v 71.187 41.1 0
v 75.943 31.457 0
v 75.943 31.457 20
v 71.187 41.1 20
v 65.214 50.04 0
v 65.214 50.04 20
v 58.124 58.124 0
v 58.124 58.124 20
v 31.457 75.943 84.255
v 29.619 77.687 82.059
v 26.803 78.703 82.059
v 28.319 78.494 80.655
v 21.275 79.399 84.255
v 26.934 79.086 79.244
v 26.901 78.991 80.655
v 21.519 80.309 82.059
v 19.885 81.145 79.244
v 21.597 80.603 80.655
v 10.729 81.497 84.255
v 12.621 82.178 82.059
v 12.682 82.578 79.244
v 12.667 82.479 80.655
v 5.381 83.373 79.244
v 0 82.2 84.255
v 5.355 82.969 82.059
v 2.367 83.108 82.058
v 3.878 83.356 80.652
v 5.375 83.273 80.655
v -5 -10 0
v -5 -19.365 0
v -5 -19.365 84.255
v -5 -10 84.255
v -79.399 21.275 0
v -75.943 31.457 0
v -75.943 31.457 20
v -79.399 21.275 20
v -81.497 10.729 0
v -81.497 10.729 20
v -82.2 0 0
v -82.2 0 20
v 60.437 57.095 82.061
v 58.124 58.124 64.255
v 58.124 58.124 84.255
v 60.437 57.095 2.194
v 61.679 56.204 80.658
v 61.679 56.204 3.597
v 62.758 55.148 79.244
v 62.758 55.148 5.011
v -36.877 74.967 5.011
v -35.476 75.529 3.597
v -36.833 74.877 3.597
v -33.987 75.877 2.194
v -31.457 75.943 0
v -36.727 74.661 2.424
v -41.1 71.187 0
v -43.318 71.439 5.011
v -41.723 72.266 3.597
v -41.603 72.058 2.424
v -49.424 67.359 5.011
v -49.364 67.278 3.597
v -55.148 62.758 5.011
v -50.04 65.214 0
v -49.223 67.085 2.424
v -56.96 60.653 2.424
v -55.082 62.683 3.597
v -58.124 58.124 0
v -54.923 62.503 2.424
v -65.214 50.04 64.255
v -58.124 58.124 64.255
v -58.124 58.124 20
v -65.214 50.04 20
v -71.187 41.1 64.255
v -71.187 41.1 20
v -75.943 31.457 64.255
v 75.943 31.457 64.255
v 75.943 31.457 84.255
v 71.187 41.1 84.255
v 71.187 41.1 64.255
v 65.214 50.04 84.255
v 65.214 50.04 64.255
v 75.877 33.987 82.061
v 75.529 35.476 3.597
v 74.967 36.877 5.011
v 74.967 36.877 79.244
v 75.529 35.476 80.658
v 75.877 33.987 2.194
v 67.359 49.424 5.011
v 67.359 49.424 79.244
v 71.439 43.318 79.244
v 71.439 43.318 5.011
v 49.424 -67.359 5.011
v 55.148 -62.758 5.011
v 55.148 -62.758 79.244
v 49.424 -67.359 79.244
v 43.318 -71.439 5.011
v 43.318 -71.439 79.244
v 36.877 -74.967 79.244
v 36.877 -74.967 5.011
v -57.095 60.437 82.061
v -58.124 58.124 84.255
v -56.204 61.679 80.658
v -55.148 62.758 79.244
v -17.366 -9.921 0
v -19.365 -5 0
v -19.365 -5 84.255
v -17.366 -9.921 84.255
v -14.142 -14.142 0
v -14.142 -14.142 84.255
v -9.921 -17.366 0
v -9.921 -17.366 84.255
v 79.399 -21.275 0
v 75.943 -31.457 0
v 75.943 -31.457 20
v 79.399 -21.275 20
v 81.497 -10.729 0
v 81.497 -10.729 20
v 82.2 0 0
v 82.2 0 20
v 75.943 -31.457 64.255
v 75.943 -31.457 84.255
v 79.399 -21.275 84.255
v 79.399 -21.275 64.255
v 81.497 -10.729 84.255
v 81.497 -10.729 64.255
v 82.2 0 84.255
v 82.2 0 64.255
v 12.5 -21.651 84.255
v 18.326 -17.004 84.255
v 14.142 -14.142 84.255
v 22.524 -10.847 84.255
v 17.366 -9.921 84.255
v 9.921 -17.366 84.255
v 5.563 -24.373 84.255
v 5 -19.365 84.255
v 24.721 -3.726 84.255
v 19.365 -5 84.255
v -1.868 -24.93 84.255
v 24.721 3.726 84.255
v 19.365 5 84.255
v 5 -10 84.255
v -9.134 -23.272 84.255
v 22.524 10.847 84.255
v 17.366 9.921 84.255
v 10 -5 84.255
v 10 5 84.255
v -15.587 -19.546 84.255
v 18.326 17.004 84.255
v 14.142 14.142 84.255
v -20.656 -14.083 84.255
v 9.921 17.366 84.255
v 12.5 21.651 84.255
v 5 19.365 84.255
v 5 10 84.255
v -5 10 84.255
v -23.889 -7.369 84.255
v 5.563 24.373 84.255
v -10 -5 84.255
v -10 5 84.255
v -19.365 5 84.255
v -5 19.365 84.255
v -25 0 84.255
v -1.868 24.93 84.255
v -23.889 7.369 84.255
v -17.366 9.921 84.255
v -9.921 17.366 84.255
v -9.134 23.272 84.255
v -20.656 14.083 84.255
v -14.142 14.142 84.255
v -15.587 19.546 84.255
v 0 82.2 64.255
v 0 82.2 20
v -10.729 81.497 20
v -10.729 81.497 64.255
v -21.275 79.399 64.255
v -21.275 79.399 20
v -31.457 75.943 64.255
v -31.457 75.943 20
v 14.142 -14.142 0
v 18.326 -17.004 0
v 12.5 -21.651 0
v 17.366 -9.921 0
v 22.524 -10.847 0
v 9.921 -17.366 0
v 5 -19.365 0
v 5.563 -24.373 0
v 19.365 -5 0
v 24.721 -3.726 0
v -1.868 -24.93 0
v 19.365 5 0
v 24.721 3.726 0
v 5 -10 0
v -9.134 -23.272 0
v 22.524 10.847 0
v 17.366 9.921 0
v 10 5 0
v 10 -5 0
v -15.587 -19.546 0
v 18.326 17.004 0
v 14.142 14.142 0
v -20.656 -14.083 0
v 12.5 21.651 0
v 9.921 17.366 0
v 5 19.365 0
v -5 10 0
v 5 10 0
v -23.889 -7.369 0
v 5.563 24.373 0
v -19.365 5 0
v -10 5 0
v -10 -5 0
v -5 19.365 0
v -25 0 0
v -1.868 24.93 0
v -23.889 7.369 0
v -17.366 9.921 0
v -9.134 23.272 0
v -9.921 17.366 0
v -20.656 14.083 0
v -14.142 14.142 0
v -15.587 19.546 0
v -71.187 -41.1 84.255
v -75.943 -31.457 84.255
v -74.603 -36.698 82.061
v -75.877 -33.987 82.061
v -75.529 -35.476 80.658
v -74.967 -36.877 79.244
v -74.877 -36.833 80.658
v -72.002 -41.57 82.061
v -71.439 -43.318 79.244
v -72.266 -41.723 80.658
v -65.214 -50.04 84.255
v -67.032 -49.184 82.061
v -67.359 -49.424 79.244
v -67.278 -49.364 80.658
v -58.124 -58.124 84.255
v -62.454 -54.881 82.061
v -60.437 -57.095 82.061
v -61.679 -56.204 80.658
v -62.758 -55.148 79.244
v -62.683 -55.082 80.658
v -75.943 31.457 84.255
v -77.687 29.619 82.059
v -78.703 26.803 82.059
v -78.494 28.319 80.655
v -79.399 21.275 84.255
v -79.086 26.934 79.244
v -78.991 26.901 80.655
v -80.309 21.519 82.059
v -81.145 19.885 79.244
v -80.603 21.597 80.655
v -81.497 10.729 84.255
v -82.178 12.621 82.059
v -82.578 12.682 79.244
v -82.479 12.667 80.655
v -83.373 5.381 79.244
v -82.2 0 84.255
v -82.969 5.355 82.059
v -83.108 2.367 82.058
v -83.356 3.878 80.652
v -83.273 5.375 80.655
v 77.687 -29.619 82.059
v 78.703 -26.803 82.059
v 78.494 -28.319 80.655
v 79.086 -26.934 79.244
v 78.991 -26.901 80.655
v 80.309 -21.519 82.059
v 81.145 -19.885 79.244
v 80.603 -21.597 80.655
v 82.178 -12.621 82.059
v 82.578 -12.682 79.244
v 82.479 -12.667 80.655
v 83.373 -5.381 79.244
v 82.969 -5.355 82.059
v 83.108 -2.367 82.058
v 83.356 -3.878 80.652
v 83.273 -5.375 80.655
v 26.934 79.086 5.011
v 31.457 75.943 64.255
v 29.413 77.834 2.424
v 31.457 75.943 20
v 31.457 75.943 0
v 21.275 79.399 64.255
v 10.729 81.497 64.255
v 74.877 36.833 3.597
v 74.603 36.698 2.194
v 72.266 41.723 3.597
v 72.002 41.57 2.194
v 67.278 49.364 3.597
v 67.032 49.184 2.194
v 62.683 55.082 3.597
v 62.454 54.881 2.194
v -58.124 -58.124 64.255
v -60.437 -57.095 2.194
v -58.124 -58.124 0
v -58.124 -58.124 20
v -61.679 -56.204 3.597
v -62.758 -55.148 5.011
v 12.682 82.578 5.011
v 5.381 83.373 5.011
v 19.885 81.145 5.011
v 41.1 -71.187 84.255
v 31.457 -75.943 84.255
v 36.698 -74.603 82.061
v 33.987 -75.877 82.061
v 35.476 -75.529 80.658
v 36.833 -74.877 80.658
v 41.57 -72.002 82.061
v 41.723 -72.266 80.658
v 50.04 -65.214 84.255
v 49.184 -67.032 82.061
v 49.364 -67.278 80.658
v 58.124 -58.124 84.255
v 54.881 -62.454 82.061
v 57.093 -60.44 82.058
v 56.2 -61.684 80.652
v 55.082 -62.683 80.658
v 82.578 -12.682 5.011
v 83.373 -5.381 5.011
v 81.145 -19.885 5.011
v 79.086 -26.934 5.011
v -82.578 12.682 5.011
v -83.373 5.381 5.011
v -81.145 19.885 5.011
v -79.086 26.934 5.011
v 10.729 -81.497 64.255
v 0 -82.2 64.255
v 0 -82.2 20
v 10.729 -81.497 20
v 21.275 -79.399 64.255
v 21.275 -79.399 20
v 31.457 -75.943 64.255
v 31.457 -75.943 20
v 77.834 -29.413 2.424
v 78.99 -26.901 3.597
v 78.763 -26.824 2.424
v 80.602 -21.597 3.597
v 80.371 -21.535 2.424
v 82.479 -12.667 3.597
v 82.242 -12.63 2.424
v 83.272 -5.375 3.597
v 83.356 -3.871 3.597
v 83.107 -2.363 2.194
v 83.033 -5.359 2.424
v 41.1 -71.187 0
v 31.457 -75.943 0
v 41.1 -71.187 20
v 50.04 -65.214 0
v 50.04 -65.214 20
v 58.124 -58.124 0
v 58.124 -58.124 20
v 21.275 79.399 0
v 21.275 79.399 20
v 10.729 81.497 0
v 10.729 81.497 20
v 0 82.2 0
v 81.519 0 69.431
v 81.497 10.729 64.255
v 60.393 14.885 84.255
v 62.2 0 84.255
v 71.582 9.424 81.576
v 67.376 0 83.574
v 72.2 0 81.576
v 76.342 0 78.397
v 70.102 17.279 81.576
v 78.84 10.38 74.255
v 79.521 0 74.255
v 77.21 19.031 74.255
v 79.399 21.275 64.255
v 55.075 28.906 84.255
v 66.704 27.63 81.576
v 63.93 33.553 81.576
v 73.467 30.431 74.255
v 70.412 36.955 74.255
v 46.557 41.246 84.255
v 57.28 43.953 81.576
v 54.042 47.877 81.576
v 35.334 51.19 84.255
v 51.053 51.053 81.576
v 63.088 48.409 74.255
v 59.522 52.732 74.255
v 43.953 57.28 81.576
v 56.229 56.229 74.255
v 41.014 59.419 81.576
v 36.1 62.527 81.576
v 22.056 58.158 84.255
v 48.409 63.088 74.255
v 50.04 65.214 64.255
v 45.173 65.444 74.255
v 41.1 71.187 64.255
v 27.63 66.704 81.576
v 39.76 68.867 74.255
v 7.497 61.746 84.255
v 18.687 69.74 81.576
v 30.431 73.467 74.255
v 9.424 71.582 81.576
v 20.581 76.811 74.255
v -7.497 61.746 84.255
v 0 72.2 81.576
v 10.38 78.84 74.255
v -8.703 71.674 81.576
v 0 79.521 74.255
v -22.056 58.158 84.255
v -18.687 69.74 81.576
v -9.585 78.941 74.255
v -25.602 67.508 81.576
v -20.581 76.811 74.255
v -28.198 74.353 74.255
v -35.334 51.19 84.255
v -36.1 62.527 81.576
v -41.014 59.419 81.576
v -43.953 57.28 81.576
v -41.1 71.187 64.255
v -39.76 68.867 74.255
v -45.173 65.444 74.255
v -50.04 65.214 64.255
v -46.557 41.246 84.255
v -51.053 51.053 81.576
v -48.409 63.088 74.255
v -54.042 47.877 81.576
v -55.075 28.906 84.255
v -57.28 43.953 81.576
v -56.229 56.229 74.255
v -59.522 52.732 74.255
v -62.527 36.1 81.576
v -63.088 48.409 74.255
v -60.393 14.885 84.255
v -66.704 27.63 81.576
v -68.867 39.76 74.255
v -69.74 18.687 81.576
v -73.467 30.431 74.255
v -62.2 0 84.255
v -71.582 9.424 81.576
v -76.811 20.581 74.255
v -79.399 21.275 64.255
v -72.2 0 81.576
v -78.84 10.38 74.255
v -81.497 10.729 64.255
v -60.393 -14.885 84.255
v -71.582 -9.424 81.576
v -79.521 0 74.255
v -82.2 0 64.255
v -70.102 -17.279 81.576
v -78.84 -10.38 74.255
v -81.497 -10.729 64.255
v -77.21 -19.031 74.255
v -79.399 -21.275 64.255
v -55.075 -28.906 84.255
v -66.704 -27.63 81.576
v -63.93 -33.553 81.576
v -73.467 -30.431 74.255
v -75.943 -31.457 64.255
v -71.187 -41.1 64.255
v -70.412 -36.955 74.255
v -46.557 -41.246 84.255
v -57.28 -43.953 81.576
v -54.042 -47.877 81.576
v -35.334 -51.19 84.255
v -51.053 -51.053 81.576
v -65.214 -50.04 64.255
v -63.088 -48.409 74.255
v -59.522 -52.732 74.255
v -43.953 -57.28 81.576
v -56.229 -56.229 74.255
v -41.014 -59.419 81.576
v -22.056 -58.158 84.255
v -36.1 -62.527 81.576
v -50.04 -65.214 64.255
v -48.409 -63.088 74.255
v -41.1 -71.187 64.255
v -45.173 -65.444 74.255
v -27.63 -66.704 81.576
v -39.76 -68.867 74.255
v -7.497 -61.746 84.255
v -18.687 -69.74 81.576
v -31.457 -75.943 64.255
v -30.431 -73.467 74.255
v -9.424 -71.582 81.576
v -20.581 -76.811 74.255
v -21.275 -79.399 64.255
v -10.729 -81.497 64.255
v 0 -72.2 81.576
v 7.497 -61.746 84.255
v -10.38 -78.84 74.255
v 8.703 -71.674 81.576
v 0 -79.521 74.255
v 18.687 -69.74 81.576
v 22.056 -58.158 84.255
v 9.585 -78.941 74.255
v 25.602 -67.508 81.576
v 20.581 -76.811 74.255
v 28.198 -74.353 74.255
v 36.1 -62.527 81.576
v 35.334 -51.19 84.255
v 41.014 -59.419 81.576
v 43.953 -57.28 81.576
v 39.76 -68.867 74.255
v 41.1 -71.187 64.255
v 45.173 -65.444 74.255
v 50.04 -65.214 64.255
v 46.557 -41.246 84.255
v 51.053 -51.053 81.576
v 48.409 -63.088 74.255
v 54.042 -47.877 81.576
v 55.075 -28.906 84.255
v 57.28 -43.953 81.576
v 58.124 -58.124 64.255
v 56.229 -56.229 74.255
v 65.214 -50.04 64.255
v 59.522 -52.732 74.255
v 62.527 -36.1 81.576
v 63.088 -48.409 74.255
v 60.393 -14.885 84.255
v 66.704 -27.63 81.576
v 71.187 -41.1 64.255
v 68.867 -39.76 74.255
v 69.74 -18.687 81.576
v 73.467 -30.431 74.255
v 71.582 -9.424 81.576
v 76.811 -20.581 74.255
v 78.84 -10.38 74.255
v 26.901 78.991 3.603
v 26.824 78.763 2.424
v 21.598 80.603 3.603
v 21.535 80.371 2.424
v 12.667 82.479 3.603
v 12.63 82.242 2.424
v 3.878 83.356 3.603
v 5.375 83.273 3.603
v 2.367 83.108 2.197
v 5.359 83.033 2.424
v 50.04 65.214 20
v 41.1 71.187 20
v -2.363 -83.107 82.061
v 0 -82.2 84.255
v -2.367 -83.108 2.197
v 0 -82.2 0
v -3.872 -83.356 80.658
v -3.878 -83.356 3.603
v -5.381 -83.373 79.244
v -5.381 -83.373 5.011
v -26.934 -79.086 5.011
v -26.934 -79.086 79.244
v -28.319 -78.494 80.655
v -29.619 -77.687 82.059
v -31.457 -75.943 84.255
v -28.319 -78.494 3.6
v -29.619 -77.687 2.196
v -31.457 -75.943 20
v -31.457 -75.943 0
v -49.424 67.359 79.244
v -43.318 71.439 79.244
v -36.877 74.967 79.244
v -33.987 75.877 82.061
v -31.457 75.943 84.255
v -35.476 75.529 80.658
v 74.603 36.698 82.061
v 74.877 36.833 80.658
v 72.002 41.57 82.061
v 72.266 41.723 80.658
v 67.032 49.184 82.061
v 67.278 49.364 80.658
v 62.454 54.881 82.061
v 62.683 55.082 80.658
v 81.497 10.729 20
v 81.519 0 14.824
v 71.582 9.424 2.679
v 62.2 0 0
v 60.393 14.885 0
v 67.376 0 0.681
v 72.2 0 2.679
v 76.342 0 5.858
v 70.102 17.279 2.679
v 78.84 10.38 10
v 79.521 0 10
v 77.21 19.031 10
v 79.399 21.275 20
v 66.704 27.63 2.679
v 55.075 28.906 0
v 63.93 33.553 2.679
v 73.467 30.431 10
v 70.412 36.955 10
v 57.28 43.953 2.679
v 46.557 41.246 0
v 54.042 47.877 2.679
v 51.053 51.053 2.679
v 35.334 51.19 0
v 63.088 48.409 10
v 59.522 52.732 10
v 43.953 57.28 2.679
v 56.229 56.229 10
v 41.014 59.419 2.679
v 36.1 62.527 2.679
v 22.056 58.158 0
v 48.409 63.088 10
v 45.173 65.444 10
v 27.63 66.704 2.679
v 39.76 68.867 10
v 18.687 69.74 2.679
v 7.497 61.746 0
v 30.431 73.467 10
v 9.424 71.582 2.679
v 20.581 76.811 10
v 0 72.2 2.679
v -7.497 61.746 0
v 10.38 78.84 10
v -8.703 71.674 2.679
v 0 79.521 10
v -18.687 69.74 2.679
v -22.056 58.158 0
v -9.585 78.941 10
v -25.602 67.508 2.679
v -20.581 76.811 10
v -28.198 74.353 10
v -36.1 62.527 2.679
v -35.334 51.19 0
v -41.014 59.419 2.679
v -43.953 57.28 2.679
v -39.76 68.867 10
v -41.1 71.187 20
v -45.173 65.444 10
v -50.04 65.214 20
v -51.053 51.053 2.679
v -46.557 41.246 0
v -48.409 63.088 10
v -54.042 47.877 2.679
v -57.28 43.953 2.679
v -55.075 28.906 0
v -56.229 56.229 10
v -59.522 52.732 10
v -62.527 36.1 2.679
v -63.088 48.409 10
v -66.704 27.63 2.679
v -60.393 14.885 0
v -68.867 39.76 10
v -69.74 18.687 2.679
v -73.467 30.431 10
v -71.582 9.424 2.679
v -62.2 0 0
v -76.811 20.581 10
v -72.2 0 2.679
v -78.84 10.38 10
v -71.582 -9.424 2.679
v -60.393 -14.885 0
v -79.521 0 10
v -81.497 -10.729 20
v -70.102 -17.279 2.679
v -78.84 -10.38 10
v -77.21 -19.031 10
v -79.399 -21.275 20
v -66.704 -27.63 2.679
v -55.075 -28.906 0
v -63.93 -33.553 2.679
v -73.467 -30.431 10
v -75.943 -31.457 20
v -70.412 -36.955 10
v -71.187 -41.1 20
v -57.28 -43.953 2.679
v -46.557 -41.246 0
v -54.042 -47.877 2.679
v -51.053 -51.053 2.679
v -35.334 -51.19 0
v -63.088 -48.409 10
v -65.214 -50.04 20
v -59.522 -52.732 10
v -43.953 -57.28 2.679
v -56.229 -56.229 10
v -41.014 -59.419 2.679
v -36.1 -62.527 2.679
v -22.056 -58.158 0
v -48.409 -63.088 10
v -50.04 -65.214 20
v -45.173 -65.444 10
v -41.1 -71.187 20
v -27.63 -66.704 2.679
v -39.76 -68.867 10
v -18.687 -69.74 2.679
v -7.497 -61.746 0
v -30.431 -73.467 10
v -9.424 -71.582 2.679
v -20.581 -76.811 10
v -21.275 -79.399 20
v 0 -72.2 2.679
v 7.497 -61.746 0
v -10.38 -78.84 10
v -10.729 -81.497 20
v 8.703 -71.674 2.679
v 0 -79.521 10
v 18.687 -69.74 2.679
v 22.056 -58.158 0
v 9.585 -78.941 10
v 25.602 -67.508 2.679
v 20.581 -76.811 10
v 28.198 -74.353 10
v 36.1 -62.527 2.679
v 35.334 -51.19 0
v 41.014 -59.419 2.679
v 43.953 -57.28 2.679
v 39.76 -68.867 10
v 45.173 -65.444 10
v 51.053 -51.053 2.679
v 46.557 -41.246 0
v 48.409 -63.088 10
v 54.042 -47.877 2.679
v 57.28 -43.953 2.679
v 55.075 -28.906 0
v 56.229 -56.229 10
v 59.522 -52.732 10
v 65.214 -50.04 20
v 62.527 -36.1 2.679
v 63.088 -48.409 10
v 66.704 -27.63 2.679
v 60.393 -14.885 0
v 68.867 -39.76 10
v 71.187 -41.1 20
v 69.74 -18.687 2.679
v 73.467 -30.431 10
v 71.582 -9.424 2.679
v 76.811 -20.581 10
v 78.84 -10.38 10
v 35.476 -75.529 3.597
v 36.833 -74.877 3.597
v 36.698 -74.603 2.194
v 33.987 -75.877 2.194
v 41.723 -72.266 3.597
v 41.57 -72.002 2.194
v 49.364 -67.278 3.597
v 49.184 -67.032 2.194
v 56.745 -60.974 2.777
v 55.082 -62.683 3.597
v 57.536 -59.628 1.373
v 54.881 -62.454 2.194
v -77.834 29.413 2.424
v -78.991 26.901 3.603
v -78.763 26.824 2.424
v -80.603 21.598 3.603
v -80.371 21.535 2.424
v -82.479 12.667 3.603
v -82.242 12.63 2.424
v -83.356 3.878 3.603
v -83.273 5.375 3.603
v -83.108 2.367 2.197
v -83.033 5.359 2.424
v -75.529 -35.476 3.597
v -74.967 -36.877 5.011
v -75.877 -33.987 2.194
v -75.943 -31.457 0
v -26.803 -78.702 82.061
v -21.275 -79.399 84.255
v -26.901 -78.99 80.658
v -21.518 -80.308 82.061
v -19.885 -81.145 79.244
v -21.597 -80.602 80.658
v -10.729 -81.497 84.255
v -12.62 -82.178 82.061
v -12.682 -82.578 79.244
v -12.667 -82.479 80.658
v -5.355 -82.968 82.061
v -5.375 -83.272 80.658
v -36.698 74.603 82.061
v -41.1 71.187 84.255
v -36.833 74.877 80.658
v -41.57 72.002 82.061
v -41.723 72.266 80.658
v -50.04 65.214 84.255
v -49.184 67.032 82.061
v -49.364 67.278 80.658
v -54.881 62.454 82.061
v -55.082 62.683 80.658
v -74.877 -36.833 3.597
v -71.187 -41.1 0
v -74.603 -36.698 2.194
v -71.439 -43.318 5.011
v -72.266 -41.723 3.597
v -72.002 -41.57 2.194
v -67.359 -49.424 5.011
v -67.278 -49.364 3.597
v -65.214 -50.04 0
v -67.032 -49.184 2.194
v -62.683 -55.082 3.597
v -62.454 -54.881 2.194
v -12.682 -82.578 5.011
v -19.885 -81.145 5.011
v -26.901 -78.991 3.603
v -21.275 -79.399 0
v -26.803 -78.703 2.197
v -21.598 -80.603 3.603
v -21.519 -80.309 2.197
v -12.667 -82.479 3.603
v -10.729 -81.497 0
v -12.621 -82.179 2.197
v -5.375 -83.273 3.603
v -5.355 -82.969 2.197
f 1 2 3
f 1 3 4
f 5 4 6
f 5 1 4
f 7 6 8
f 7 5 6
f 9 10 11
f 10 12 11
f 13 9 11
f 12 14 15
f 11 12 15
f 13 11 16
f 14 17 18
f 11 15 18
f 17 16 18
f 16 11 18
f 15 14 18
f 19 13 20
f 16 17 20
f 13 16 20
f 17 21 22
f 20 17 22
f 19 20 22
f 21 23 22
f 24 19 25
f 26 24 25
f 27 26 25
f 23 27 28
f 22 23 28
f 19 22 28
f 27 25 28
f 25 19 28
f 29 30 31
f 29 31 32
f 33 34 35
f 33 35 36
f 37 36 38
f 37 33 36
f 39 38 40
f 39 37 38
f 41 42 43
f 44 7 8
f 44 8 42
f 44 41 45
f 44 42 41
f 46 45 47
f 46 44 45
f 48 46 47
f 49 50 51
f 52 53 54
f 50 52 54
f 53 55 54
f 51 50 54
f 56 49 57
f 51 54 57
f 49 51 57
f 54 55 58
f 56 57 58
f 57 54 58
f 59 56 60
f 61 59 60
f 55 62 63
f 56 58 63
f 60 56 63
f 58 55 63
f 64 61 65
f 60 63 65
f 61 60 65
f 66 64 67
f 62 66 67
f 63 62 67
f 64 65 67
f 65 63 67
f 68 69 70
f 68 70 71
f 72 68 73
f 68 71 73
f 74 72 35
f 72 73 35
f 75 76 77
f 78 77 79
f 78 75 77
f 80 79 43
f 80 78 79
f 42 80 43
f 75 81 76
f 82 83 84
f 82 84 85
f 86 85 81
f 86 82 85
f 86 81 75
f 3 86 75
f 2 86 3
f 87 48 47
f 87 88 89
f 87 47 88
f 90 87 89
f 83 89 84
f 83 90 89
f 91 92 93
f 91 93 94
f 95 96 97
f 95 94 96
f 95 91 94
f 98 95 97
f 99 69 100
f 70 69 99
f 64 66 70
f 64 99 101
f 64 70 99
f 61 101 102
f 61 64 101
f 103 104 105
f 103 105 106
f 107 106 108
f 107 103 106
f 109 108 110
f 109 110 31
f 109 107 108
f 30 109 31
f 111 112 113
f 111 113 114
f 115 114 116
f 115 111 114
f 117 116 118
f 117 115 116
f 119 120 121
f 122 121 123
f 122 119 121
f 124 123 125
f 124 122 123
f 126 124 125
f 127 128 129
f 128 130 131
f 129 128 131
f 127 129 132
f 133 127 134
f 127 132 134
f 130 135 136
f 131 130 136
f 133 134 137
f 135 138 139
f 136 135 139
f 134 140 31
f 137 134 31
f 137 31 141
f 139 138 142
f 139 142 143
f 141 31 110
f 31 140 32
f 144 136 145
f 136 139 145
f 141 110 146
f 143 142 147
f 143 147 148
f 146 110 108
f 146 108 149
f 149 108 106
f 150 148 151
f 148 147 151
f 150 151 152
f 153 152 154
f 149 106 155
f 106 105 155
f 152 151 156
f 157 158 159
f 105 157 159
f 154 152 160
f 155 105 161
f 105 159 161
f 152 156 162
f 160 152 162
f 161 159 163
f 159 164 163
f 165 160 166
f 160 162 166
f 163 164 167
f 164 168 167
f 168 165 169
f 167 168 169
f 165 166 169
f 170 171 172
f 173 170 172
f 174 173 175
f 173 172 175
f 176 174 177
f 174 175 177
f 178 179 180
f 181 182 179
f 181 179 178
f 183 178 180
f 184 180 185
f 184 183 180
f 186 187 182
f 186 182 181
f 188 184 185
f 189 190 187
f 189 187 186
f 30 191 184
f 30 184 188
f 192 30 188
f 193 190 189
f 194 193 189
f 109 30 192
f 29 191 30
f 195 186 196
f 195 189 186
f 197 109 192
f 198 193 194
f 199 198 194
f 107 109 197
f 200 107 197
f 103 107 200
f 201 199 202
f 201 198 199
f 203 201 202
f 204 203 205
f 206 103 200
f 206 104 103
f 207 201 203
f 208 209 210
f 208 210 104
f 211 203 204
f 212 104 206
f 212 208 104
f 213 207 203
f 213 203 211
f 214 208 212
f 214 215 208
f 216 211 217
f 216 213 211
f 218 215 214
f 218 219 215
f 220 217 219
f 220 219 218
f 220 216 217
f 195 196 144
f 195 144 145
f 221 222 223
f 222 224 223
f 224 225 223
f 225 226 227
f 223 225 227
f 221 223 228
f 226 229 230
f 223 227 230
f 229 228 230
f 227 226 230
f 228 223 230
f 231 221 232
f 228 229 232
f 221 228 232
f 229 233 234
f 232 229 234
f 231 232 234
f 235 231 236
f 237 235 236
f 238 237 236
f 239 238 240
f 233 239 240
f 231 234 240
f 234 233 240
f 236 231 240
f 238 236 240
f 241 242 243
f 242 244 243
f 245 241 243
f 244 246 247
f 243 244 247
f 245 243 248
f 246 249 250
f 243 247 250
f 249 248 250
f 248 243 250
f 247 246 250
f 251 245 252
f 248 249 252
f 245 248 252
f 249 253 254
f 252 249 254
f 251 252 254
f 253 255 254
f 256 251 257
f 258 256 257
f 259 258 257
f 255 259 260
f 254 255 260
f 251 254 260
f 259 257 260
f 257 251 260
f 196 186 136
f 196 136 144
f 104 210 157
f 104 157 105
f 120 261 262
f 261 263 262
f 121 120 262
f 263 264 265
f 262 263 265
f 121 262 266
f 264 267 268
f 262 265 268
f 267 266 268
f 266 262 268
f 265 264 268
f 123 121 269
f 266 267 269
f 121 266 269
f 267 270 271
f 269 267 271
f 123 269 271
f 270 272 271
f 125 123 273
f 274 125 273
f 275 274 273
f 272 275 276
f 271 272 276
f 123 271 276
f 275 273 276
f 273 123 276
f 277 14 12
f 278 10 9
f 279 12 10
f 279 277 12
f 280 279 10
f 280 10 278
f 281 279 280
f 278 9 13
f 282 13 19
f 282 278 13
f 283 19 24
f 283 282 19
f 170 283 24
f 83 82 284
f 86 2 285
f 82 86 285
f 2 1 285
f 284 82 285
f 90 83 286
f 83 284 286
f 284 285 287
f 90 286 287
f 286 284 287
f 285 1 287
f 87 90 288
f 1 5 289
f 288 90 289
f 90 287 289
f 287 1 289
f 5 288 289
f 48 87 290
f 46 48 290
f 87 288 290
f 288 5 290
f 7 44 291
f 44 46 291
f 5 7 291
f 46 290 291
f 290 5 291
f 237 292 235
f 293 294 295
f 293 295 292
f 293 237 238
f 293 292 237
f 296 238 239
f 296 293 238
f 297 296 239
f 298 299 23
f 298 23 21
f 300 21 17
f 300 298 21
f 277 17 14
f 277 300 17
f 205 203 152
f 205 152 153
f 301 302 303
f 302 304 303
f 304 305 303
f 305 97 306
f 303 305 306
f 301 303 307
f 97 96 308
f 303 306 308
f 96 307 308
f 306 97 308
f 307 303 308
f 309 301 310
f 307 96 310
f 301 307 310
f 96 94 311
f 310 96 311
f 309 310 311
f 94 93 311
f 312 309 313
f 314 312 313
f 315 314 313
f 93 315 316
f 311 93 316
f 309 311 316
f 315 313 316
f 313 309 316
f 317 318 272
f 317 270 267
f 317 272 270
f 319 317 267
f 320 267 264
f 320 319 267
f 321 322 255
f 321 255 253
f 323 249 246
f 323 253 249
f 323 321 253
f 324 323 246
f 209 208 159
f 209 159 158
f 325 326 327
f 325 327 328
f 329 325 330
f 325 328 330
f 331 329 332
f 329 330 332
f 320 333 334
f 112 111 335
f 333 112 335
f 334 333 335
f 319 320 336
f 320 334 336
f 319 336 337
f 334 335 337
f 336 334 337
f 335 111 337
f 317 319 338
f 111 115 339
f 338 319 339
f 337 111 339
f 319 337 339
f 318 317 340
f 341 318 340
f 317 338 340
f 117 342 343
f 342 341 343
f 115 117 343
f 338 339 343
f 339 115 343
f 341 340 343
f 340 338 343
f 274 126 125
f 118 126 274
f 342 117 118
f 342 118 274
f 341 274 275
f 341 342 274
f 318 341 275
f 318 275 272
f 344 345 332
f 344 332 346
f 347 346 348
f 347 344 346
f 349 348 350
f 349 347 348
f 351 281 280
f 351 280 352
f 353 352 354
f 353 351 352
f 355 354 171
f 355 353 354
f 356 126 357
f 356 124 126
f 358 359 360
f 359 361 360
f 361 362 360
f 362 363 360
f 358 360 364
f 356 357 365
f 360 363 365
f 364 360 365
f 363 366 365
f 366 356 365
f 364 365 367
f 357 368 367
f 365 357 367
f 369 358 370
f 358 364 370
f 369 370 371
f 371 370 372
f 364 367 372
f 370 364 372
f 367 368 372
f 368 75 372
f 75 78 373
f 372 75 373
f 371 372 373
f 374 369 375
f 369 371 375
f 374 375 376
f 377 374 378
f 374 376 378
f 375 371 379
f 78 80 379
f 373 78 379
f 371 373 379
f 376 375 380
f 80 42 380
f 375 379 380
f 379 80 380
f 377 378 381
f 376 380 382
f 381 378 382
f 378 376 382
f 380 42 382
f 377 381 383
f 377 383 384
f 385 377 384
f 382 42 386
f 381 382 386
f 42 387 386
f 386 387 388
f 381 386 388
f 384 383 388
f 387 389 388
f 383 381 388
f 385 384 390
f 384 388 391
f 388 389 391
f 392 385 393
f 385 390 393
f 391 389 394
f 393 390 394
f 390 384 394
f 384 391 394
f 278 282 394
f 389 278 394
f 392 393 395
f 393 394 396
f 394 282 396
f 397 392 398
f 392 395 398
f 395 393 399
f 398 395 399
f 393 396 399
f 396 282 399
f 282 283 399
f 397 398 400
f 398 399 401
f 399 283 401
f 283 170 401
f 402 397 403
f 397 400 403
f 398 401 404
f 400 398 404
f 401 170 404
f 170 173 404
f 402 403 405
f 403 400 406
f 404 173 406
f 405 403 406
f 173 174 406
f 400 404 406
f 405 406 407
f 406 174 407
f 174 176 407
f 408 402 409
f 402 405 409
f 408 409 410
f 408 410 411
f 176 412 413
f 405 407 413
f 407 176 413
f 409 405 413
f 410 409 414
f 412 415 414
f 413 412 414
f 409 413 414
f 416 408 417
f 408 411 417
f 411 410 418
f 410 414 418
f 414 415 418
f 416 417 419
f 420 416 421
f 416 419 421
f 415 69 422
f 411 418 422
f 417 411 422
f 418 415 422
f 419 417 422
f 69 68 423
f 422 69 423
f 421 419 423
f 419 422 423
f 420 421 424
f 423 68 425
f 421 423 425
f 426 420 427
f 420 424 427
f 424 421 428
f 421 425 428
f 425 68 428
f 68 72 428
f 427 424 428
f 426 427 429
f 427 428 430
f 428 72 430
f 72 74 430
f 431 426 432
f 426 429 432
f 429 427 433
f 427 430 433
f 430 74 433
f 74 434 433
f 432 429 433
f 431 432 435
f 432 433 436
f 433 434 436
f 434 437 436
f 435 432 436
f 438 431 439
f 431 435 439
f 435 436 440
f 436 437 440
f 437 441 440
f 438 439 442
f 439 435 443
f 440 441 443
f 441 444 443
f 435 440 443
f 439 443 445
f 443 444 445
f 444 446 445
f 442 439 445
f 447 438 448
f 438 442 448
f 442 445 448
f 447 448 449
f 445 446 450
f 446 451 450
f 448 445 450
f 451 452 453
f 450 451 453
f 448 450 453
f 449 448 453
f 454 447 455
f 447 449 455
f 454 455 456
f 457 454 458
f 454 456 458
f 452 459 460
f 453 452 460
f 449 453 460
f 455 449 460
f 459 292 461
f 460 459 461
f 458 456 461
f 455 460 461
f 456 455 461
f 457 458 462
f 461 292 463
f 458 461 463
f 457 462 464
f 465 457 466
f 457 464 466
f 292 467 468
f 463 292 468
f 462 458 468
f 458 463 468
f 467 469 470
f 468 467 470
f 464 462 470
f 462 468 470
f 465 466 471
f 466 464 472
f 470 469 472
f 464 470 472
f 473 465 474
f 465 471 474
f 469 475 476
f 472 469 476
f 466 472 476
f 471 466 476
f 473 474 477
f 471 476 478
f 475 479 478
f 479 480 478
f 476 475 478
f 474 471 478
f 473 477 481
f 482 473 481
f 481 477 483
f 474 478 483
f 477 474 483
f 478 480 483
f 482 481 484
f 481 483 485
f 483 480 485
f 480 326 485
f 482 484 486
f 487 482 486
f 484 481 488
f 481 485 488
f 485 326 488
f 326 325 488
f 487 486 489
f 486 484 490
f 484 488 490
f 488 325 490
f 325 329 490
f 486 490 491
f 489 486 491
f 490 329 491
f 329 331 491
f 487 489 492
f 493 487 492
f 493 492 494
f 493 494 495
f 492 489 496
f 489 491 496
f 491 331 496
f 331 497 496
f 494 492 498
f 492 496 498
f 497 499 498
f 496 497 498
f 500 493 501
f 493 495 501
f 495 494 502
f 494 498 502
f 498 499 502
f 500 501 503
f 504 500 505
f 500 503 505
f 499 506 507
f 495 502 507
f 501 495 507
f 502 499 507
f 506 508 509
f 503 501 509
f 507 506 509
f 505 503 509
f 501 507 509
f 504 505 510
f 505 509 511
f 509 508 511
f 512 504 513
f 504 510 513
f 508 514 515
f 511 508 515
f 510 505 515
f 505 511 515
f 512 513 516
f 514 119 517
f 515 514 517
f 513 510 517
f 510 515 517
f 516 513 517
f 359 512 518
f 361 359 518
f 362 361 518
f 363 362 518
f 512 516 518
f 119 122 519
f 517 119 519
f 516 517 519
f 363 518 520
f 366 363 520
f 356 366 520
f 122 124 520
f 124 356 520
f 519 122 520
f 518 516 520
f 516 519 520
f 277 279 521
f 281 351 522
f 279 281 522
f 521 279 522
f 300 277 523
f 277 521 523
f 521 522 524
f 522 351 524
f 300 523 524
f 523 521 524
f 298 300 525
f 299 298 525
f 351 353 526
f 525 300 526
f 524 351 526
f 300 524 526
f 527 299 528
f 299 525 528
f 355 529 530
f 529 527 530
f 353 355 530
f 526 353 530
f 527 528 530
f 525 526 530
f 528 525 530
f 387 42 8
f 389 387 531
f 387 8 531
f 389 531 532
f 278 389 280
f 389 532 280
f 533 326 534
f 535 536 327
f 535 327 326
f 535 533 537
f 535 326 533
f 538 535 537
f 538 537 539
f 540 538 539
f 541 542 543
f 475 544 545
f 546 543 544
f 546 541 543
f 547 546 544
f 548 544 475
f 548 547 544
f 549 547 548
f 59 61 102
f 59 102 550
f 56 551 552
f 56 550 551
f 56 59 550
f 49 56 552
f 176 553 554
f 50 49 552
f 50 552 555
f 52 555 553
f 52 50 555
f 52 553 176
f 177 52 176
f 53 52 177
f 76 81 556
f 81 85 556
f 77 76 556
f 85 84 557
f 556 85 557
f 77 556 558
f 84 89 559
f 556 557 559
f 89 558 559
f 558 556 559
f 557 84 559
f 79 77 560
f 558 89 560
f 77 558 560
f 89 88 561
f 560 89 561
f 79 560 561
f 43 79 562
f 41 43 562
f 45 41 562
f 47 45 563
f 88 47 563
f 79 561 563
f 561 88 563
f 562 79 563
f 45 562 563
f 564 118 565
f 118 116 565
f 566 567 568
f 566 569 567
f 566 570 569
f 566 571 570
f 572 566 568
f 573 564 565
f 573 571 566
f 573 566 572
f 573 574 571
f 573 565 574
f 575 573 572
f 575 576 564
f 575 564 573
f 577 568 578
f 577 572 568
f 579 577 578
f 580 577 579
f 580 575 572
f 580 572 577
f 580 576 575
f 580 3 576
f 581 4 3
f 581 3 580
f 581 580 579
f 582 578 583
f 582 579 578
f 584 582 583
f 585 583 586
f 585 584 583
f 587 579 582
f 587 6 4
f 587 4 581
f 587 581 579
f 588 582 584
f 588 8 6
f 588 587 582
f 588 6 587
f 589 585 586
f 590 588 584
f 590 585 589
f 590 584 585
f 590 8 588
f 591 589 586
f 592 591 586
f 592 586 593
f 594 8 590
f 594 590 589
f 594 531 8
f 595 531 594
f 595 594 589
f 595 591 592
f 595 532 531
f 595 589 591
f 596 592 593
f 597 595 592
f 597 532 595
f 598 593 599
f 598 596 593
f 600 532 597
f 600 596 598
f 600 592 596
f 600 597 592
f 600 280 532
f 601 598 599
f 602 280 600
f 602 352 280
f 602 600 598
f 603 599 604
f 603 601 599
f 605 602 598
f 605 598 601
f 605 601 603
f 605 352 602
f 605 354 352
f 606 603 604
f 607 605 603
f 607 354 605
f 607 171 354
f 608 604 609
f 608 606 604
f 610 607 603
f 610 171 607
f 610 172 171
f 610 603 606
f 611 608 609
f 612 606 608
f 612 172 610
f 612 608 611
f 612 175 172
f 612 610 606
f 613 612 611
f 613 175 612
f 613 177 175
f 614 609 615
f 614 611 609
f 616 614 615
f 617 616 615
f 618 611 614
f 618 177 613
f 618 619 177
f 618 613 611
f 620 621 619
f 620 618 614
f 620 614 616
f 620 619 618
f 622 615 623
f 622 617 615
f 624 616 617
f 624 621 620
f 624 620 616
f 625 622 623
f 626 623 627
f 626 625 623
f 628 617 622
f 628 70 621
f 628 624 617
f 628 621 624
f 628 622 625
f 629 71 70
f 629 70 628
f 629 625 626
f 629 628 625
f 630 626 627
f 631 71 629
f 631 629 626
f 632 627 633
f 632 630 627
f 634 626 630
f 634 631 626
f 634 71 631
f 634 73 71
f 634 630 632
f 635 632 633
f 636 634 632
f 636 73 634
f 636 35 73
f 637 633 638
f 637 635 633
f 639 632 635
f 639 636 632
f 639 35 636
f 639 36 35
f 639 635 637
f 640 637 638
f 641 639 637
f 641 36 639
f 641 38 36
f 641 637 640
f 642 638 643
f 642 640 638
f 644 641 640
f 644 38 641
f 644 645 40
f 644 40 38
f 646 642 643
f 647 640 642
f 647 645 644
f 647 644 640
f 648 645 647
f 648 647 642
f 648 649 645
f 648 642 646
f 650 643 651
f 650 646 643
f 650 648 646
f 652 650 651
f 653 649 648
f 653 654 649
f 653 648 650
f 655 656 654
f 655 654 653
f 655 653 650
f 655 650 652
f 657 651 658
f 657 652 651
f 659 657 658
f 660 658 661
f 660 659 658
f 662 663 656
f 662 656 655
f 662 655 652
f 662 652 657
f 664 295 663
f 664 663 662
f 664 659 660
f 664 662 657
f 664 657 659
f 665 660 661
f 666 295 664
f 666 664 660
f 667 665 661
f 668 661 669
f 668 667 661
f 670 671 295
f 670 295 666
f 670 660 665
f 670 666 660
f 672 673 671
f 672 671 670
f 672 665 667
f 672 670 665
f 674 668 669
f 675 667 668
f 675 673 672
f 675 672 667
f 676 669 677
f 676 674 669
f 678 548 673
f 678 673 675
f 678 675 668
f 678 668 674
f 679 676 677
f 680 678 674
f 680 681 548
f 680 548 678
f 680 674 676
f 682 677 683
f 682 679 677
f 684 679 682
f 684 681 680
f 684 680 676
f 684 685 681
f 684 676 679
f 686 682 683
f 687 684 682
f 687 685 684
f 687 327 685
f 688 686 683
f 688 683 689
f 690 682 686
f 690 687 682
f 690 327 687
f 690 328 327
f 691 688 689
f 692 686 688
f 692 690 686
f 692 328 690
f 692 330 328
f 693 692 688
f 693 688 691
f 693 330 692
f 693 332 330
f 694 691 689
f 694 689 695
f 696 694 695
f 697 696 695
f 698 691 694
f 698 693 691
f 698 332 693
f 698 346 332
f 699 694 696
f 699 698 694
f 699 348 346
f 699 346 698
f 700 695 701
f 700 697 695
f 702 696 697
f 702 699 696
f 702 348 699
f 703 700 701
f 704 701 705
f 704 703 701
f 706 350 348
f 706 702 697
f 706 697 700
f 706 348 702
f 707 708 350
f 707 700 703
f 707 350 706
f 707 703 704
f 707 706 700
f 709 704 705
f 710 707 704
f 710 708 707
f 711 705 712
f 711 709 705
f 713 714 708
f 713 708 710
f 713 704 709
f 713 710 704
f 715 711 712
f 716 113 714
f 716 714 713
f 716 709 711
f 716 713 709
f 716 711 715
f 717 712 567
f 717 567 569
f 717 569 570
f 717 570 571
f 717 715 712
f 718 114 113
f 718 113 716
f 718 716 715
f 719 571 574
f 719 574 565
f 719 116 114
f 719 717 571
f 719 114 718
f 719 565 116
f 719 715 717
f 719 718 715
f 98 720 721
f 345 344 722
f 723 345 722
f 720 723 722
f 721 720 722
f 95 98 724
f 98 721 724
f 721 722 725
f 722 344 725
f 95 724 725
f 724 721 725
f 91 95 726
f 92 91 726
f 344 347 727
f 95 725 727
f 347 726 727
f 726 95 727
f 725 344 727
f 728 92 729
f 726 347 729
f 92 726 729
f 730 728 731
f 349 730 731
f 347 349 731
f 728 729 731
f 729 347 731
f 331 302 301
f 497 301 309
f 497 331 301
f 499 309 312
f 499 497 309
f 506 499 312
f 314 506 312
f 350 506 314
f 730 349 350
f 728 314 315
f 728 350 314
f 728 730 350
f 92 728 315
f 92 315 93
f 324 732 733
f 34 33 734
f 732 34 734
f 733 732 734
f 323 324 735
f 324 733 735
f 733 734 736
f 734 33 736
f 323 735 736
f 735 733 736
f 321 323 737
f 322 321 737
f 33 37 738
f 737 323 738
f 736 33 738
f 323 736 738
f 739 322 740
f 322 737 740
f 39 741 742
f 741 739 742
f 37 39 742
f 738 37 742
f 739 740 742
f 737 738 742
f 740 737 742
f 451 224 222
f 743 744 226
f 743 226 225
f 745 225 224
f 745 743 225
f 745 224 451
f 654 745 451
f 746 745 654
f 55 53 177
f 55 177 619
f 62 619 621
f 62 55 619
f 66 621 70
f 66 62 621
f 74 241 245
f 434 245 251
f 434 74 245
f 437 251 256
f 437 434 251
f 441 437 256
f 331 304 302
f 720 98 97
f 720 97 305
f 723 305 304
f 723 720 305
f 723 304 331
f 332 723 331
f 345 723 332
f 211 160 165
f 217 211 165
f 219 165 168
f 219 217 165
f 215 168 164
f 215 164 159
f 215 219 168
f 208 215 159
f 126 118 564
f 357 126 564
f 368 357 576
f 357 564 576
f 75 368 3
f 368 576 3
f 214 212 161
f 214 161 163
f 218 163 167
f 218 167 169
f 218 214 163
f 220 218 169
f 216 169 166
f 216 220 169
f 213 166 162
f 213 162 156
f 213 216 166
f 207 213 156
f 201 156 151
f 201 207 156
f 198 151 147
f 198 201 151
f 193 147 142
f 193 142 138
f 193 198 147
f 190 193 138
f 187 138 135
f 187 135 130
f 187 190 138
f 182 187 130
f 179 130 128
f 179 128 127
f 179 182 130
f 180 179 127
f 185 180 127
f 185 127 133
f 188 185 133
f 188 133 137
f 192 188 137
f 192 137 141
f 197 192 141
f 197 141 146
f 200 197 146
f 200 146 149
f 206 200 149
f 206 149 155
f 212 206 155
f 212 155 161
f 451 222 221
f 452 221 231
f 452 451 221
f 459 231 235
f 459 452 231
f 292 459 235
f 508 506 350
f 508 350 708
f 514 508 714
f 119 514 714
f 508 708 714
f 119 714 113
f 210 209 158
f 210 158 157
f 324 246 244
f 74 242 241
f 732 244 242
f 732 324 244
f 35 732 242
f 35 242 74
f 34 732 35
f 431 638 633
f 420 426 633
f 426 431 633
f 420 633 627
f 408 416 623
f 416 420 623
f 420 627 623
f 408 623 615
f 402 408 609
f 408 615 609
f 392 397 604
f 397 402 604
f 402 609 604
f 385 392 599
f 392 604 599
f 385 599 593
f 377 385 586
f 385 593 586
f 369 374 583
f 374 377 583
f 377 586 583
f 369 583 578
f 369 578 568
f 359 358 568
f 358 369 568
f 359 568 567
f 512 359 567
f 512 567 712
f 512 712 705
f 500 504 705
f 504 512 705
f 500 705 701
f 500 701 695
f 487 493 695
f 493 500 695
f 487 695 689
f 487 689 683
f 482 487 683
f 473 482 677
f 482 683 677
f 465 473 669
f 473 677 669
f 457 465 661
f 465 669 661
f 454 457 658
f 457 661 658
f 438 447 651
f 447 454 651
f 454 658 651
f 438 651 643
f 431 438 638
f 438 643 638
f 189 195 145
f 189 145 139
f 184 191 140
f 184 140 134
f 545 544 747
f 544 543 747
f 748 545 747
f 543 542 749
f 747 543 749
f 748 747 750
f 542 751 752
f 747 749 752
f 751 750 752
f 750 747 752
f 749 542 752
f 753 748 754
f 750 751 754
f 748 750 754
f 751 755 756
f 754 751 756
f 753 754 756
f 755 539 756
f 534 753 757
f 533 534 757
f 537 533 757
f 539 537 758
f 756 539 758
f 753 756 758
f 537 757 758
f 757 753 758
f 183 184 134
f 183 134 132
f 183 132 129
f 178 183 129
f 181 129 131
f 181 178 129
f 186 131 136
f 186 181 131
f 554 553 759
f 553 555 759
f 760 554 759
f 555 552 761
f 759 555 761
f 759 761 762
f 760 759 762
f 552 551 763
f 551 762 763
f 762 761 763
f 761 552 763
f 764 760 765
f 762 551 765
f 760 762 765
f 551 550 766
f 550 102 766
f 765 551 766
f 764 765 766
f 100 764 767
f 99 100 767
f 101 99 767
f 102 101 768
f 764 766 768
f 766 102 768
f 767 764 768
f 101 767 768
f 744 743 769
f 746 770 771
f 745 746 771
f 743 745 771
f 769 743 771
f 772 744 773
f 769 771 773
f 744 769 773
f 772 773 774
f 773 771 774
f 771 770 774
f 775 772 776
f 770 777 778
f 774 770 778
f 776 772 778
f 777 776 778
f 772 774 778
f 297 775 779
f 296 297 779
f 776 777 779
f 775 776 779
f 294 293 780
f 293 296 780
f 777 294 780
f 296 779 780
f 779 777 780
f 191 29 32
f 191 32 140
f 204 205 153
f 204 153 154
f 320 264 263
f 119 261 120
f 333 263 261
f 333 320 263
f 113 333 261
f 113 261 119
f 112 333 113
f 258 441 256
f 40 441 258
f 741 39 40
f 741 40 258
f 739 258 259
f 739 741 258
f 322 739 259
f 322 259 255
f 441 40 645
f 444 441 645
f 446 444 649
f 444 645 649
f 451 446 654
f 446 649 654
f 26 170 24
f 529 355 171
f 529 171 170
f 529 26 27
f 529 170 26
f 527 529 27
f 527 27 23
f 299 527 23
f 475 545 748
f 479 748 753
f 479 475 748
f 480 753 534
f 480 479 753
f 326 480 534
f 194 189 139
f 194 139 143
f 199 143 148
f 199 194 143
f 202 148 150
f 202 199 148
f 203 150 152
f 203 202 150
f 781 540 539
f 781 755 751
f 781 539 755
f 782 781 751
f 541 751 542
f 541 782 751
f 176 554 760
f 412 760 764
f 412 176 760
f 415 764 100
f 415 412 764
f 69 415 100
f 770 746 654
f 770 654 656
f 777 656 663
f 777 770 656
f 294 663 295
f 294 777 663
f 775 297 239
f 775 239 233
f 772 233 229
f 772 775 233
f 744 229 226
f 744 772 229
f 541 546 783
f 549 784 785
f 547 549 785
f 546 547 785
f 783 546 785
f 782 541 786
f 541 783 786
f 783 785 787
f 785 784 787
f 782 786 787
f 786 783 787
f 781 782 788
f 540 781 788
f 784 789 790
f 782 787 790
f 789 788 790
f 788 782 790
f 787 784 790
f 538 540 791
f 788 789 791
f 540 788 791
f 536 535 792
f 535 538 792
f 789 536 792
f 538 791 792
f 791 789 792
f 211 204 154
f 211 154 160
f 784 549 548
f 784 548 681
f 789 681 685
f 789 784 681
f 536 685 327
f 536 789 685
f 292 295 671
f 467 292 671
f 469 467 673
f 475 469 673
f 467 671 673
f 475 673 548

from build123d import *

# Parameters (mm, degrees)
SKETCH1_R           = 82.2
SKETCH1_R_2         = 20
BOSS_EXTRUDE1_DEPTH = 84.255
BOSS_EXTRUDE2_DEPTH = 84.255
FILLET1_R           = 20
SKETCH3_R           = 62.2
SKETCH3_R_2         = 25
CUT_EXTRUDE1_DEPTH  = 142
BOSS_EXTRUDE3_DEPTH = 84.255
FILLET2_DEPTH       = 84.255


with BuildPart() as part:
    # Sketch1 → Boss-Extrude1 (new body)
    with BuildSketch(Plane.XY):
        Circle(SKETCH1_R)
        Circle(SKETCH1_R_2, mode=Mode.SUBTRACT)
    extrude(amount=BOSS_EXTRUDE1_DEPTH)

    # Sketch2 → Boss-Extrude2 (add)
    with BuildSketch(Plane(origin=(0, 0, 0), x_dir=(-1, 0, 0), z_dir=(0, 0, -1))):
        with BuildLine():
            ThreePointArc((20, 0), (19.840593925, 2.52008585), (19.364916731, 5))
            Line((19.364916731, 5), (9.999996731, 5))
            Line((9.999996731, 5), (9.999996731, -5))
            Line((9.999996731, -5), (19.364916731, -5))
            ThreePointArc((19.364916731, -5), (19.840593925, -2.52008585), (20, 0))
        make_face()
        with BuildLine():
            ThreePointArc((5, 19.364916731), (0, 20), (-5, 19.364916731))
            Line((-5, 19.364916731), (-5, 10))
            Line((-5, 10), (5, 10))
            Line((5, 10), (5, 19.364916731))
        make_face()
        with BuildLine():
            Line((-9.999996731, 5), (-19.364916731, 5))
            ThreePointArc((-19.364916731, 5), (-20, 0), (-19.364916731, -5))
            Line((-19.364916731, -5), (-9.999996731, -5))
            Line((-9.999996731, -5), (-9.999996731, 5))
        make_face()
        with BuildLine():
            Line((-5, -10), (-5, -19.364916731))
            ThreePointArc((-5, -19.364916731), (0, -20), (5, -19.364916731))
            Line((5, -19.364916731), (5, -10))
            Line((5, -10), (-5, -10))
        make_face()
    extrude(amount=-BOSS_EXTRUDE2_DEPTH)

    # Fillet1
    fillet1_edges = [part.edges().sort_by_distance(p)[0] for p in [
        (-82.2, 0, 0),
        (-82.2, 0, 84.255),
    ]]
    fillet(fillet1_edges, radius=FILLET1_R)

    # Sketch3 → Cut-Extrude1 (cut)
    with BuildSketch(Plane(origin=(0, 0, 0), x_dir=(-1, 0, 0), z_dir=(0, 0, -1))):
        Circle(SKETCH3_R)
        Circle(SKETCH3_R_2, mode=Mode.SUBTRACT)
    extrude(amount=-CUT_EXTRUDE1_DEPTH, mode=Mode.SUBTRACT)


with BuildPart() as cut_extrude1_piece_1:
    # of the separate pieces the step leaves, piece 1, a body of its own (cut_extrude1_pieces)
    add(part.part.solids().sort_by_distance((82.2, 0, 20))[0])

    # Sketch5 → Boss-Extrude3 (add)
    with BuildSketch(Plane(origin=(0, 0, 0), x_dir=(-1, 0, 0), z_dir=(0, 0, -1))):
        with BuildLine():
            ThreePointArc((-31.45657814, 75.942897572), (-16.03642447, 80.620550049), (0, 82.2))
            Line((0, 82.2), (0, 83.546013048))
            ThreePointArc((0, 83.546013048), (-16.299018589, 81.940699834), (-31.971675034, 77.186451478))
            Line((-31.971675034, 77.186451478), (-31.45657814, 75.942897572))
        make_face()
        with BuildLine():
            ThreePointArc((-75.942897572, 31.45657814), (-68.346802131, 45.667873154), (-58.124177414, 58.124177414))
            Line((-58.124177414, 58.124177414), (-59.075952367, 59.075952367))
            ThreePointArc((-59.075952367, 59.075952367), (-69.465971078, 46.415677937), (-77.186451478, 31.971675034))
            Line((-77.186451478, 31.971675034), (-75.942897572, 31.45657814))
        make_face()
        with BuildLine():
            ThreePointArc((-75.942897572, -31.45657814), (-80.620550049, -16.03642447), (-82.2, 0))
            Line((-82.2, 0), (-83.546013048, 0))
            ThreePointArc((-83.546013048, 0), (-81.940699834, -16.299018589), (-77.186451478, -31.971675034))
            Line((-77.186451478, -31.971675034), (-75.942897572, -31.45657814))
        make_face()
        with BuildLine():
            ThreePointArc((-31.45657814, -75.942897572), (-45.667873154, -68.346802131), (-58.124177414, -58.124177414))
            Line((-58.124177414, -58.124177414), (-59.075952367, -59.075952367))
            ThreePointArc((-59.075952367, -59.075952367), (-46.415677937, -69.465971078), (-31.971675034, -77.186451478))
            Line((-31.971675034, -77.186451478), (-31.45657814, -75.942897572))
        make_face()
        with BuildLine():
            ThreePointArc((31.45657814, -75.942897572), (16.03642447, -80.620550049), (0, -82.2))
            Line((0, -82.2), (0, -83.546013048))
            ThreePointArc((0, -83.546013048), (16.299018589, -81.940699834), (31.971675034, -77.186451478))
            Line((31.971675034, -77.186451478), (31.45657814, -75.942897572))
        make_face()
        with BuildLine():
            ThreePointArc((75.942897572, -31.45657814), (68.346802131, -45.667873154), (58.124177414, -58.124177414))
            Line((58.124177414, -58.124177414), (59.075952367, -59.075952367))
            ThreePointArc((59.075952367, -59.075952367), (69.465971078, -46.415677937), (77.186451478, -31.971675034))
            Line((77.186451478, -31.971675034), (75.942897572, -31.45657814))
        make_face()
        with BuildLine():
            ThreePointArc((75.942897572, 31.45657814), (80.620550049, 16.03642447), (82.2, 0))
            Line((82.2, 0), (83.546013048, 0))
            ThreePointArc((83.546013048, 0), (81.940699834, 16.299018589), (77.186451478, 31.971675034))
            Line((77.186451478, 31.971675034), (75.942897572, 31.45657814))
        make_face()
        with BuildLine():
            ThreePointArc((31.45657814, 75.942897572), (45.667873154, 68.346802131), (58.124177414, 58.124177414))
            Line((58.124177414, 58.124177414), (59.075952367, 59.075952367))
            ThreePointArc((59.075952367, 59.075952367), (46.415677937, 69.465971078), (31.971675034, 77.186451478))
            Line((31.971675034, 77.186451478), (31.45657814, 75.942897572))
        make_face()
    extrude(amount=-BOSS_EXTRUDE3_DEPTH)

    # Fillet2: read off the stored shape, not the designer's step
    # Fillet2 outline → Fillet2 (cut)
    with BuildSketch(Plane.XY):
        with BuildLine():
            ThreePointArc((0, 82.2), (2.608384979, 83.164048917), (5.381398308, 83.372518544))
            ThreePointArc((5.381398308, 83.372518544), (2.692097142, 83.502628157), (0, 83.546013048))
            Line((0, 83.546013048), (0, 82.2))
        make_face()
        with BuildLine():
            ThreePointArc((31.971675034, 77.186451478), (29.467898906, 78.17659004), (26.933517808, 79.085535433))
            ThreePointArc((26.933517808, 79.085535433), (29.415670194, 77.831748352), (31.45657814, 75.942897572))
            Line((31.45657814, 75.942897572), (31.971675034, 77.186451478))
        make_face()
        with BuildLine():
            ThreePointArc((-58.124177414, 58.124177414), (-56.961456234, 60.650269647), (-55.148049991, 62.758496463))
            ThreePointArc((-55.148049991, 62.758496463), (-57.141674472, 60.948874762), (-59.075952367, 59.075952367))
            Line((-59.075952367, 59.075952367), (-58.124177414, 58.124177414))
        make_face()
        with BuildLine():
            ThreePointArc((-31.971675034, 77.186451478), (-34.442245804, 76.116148091), (-36.877045315, 74.966791481))
            ThreePointArc((-36.877045315, 74.966791481), (-34.235337184, 75.835376919), (-31.45657814, 75.942897572))
            Line((-31.45657814, 75.942897572), (-31.971675034, 77.186451478))
        make_face()
        with BuildLine():
            ThreePointArc((-82.2, 0), (-83.164048917, 2.608384979), (-83.372518544, 5.381398308))
            ThreePointArc((-83.372518544, 5.381398308), (-83.502628157, 2.692097142), (-83.546013048, 0))
            Line((-83.546013048, 0), (-82.2, 0))
        make_face()
        with BuildLine():
            ThreePointArc((-77.186451478, 31.971675034), (-78.17659004, 29.467898906), (-79.085535433, 26.933517808))
            ThreePointArc((-79.085535433, 26.933517808), (-77.831748352, 29.415670194), (-75.942897572, 31.45657814))
            Line((-75.942897572, 31.45657814), (-77.186451478, 31.971675034))
        make_face()
        with BuildLine():
            ThreePointArc((-58.124177414, -58.124177414), (-60.650269647, -56.961456234), (-62.758496463, -55.148049991))
            ThreePointArc((-62.758496463, -55.148049991), (-60.948874762, -57.141674472), (-59.075952367, -59.075952367))
            Line((-59.075952367, -59.075952367), (-58.124177414, -58.124177414))
        make_face()
        with BuildLine():
            ThreePointArc((-77.186451478, -31.971675034), (-76.116148091, -34.442245804), (-74.966791481, -36.877045315))
            ThreePointArc((-74.966791481, -36.877045315), (-75.835376919, -34.235337184), (-75.942897572, -31.45657814))
            Line((-75.942897572, -31.45657814), (-77.186451478, -31.971675034))
        make_face()
        with BuildLine():
            ThreePointArc((0, -82.2), (-2.608384979, -83.164048917), (-5.381398308, -83.372518544))
            ThreePointArc((-5.381398308, -83.372518544), (-2.692097142, -83.502628157), (0, -83.546013048))
            Line((0, -83.546013048), (0, -82.2))
        make_face()
        with BuildLine():
            ThreePointArc((-31.971675034, -77.186451478), (-29.467898906, -78.17659004), (-26.933517808, -79.085535433))
            ThreePointArc((-26.933517808, -79.085535433), (-29.415670194, -77.831748352), (-31.45657814, -75.942897572))
            Line((-31.45657814, -75.942897572), (-31.971675034, -77.186451478))
        make_face()
        with BuildLine():
            ThreePointArc((58.124177414, -58.124177414), (56.961456234, -60.650269647), (55.148049991, -62.758496463))
            ThreePointArc((55.148049991, -62.758496463), (57.141674472, -60.948874762), (59.075952367, -59.075952367))
            Line((59.075952367, -59.075952367), (58.124177414, -58.124177414))
        make_face()
        with BuildLine():
            ThreePointArc((31.971675034, -77.186451478), (34.442245804, -76.116148091), (36.877045315, -74.966791481))
            ThreePointArc((36.877045315, -74.966791481), (34.235337184, -75.835376919), (31.45657814, -75.942897572))
            Line((31.45657814, -75.942897572), (31.971675034, -77.186451478))
        make_face()
        with BuildLine():
            ThreePointArc((82.2, 0), (83.164048917, -2.608384979), (83.372518544, -5.381398308))
            ThreePointArc((83.372518544, -5.381398308), (83.502628157, -2.692097142), (83.546013048, 0))
            Line((83.546013048, 0), (82.2, 0))
        make_face()
        with BuildLine():
            ThreePointArc((77.186451478, -31.971675034), (78.17659004, -29.467898906), (79.085535433, -26.933517808))
            ThreePointArc((79.085535433, -26.933517808), (77.831748352, -29.415670194), (75.942897572, -31.45657814))
            Line((75.942897572, -31.45657814), (77.186451478, -31.971675034))
        make_face()
        with BuildLine():
            ThreePointArc((58.124177414, 58.124177414), (60.650269647, 56.961456234), (62.758496463, 55.148049991))
            ThreePointArc((62.758496463, 55.148049991), (60.948874762, 57.141674472), (59.075952367, 59.075952367))
            Line((59.075952367, 59.075952367), (58.124177414, 58.124177414))
        make_face()
        with BuildLine():
            ThreePointArc((77.186451478, 31.971675034), (76.116148091, 34.442245804), (74.966791481, 36.877045315))
            ThreePointArc((74.966791481, 36.877045315), (75.835376919, 34.235337184), (75.942897572, 31.45657814))
            Line((75.942897572, 31.45657814), (77.186451478, 31.971675034))
        make_face()
    extrude(amount=FILLET2_DEPTH, mode=Mode.SUBTRACT)

    # Fillet2 2 outline → Fillet2 2 (revolve, cut)
    with BuildSketch(Plane.XZ):
        with BuildLine():
            ThreePointArc((82.2, 84.255), (83.203649133, 81.838397694), (83.546013048, 79.244160766))
            Line((83.546013048, 79.244160766), (83.546013048, 84.255))
            Line((83.546013048, 84.255), (82.2, 84.255))
        make_face()
        with BuildLine():
            Line((83.546013048, 0), (83.546013048, 5.010839234))
            ThreePointArc((83.546013048, 5.010839234), (83.203649133, 2.416602306), (82.2, 0))
            Line((82.2, 0), (83.546013048, 0))
        make_face()
    revolve(axis=Axis((0, 0, 0), (0, 0, 1)), mode=Mode.SUBTRACT)


with BuildPart() as cut_extrude1_piece_2:
    # of the separate pieces the step leaves, piece 2, a body of its own (cut_extrude1_pieces)
    add(part.part.solids().sort_by_distance((-25, 0, 0))[0])


solid = Compound([cut_extrude1_piece_1.part, cut_extrude1_piece_2.part])
